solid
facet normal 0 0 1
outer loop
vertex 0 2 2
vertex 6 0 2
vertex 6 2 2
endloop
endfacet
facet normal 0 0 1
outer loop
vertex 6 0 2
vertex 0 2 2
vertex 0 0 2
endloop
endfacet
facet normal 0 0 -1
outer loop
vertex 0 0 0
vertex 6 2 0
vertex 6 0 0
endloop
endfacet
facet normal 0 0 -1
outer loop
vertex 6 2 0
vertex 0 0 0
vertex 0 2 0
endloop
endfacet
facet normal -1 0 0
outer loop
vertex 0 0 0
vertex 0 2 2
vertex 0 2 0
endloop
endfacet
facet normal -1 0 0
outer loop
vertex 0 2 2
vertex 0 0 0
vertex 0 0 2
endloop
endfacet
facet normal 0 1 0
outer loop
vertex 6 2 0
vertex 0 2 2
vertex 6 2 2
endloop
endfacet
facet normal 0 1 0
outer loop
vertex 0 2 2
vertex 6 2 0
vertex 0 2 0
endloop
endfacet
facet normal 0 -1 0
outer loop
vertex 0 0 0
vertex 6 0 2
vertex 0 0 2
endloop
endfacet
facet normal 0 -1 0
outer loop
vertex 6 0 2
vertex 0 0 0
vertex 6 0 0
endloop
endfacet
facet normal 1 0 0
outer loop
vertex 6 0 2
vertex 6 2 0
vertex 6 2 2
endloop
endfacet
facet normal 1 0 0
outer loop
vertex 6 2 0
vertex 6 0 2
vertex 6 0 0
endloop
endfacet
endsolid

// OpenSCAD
union() {
    cube([2, 2, 2]);
    translate([4, 0, 0]) cube([2, 2, 2]);
    translate([1, 0, 0]) cube([4, 2, 2]);
}
